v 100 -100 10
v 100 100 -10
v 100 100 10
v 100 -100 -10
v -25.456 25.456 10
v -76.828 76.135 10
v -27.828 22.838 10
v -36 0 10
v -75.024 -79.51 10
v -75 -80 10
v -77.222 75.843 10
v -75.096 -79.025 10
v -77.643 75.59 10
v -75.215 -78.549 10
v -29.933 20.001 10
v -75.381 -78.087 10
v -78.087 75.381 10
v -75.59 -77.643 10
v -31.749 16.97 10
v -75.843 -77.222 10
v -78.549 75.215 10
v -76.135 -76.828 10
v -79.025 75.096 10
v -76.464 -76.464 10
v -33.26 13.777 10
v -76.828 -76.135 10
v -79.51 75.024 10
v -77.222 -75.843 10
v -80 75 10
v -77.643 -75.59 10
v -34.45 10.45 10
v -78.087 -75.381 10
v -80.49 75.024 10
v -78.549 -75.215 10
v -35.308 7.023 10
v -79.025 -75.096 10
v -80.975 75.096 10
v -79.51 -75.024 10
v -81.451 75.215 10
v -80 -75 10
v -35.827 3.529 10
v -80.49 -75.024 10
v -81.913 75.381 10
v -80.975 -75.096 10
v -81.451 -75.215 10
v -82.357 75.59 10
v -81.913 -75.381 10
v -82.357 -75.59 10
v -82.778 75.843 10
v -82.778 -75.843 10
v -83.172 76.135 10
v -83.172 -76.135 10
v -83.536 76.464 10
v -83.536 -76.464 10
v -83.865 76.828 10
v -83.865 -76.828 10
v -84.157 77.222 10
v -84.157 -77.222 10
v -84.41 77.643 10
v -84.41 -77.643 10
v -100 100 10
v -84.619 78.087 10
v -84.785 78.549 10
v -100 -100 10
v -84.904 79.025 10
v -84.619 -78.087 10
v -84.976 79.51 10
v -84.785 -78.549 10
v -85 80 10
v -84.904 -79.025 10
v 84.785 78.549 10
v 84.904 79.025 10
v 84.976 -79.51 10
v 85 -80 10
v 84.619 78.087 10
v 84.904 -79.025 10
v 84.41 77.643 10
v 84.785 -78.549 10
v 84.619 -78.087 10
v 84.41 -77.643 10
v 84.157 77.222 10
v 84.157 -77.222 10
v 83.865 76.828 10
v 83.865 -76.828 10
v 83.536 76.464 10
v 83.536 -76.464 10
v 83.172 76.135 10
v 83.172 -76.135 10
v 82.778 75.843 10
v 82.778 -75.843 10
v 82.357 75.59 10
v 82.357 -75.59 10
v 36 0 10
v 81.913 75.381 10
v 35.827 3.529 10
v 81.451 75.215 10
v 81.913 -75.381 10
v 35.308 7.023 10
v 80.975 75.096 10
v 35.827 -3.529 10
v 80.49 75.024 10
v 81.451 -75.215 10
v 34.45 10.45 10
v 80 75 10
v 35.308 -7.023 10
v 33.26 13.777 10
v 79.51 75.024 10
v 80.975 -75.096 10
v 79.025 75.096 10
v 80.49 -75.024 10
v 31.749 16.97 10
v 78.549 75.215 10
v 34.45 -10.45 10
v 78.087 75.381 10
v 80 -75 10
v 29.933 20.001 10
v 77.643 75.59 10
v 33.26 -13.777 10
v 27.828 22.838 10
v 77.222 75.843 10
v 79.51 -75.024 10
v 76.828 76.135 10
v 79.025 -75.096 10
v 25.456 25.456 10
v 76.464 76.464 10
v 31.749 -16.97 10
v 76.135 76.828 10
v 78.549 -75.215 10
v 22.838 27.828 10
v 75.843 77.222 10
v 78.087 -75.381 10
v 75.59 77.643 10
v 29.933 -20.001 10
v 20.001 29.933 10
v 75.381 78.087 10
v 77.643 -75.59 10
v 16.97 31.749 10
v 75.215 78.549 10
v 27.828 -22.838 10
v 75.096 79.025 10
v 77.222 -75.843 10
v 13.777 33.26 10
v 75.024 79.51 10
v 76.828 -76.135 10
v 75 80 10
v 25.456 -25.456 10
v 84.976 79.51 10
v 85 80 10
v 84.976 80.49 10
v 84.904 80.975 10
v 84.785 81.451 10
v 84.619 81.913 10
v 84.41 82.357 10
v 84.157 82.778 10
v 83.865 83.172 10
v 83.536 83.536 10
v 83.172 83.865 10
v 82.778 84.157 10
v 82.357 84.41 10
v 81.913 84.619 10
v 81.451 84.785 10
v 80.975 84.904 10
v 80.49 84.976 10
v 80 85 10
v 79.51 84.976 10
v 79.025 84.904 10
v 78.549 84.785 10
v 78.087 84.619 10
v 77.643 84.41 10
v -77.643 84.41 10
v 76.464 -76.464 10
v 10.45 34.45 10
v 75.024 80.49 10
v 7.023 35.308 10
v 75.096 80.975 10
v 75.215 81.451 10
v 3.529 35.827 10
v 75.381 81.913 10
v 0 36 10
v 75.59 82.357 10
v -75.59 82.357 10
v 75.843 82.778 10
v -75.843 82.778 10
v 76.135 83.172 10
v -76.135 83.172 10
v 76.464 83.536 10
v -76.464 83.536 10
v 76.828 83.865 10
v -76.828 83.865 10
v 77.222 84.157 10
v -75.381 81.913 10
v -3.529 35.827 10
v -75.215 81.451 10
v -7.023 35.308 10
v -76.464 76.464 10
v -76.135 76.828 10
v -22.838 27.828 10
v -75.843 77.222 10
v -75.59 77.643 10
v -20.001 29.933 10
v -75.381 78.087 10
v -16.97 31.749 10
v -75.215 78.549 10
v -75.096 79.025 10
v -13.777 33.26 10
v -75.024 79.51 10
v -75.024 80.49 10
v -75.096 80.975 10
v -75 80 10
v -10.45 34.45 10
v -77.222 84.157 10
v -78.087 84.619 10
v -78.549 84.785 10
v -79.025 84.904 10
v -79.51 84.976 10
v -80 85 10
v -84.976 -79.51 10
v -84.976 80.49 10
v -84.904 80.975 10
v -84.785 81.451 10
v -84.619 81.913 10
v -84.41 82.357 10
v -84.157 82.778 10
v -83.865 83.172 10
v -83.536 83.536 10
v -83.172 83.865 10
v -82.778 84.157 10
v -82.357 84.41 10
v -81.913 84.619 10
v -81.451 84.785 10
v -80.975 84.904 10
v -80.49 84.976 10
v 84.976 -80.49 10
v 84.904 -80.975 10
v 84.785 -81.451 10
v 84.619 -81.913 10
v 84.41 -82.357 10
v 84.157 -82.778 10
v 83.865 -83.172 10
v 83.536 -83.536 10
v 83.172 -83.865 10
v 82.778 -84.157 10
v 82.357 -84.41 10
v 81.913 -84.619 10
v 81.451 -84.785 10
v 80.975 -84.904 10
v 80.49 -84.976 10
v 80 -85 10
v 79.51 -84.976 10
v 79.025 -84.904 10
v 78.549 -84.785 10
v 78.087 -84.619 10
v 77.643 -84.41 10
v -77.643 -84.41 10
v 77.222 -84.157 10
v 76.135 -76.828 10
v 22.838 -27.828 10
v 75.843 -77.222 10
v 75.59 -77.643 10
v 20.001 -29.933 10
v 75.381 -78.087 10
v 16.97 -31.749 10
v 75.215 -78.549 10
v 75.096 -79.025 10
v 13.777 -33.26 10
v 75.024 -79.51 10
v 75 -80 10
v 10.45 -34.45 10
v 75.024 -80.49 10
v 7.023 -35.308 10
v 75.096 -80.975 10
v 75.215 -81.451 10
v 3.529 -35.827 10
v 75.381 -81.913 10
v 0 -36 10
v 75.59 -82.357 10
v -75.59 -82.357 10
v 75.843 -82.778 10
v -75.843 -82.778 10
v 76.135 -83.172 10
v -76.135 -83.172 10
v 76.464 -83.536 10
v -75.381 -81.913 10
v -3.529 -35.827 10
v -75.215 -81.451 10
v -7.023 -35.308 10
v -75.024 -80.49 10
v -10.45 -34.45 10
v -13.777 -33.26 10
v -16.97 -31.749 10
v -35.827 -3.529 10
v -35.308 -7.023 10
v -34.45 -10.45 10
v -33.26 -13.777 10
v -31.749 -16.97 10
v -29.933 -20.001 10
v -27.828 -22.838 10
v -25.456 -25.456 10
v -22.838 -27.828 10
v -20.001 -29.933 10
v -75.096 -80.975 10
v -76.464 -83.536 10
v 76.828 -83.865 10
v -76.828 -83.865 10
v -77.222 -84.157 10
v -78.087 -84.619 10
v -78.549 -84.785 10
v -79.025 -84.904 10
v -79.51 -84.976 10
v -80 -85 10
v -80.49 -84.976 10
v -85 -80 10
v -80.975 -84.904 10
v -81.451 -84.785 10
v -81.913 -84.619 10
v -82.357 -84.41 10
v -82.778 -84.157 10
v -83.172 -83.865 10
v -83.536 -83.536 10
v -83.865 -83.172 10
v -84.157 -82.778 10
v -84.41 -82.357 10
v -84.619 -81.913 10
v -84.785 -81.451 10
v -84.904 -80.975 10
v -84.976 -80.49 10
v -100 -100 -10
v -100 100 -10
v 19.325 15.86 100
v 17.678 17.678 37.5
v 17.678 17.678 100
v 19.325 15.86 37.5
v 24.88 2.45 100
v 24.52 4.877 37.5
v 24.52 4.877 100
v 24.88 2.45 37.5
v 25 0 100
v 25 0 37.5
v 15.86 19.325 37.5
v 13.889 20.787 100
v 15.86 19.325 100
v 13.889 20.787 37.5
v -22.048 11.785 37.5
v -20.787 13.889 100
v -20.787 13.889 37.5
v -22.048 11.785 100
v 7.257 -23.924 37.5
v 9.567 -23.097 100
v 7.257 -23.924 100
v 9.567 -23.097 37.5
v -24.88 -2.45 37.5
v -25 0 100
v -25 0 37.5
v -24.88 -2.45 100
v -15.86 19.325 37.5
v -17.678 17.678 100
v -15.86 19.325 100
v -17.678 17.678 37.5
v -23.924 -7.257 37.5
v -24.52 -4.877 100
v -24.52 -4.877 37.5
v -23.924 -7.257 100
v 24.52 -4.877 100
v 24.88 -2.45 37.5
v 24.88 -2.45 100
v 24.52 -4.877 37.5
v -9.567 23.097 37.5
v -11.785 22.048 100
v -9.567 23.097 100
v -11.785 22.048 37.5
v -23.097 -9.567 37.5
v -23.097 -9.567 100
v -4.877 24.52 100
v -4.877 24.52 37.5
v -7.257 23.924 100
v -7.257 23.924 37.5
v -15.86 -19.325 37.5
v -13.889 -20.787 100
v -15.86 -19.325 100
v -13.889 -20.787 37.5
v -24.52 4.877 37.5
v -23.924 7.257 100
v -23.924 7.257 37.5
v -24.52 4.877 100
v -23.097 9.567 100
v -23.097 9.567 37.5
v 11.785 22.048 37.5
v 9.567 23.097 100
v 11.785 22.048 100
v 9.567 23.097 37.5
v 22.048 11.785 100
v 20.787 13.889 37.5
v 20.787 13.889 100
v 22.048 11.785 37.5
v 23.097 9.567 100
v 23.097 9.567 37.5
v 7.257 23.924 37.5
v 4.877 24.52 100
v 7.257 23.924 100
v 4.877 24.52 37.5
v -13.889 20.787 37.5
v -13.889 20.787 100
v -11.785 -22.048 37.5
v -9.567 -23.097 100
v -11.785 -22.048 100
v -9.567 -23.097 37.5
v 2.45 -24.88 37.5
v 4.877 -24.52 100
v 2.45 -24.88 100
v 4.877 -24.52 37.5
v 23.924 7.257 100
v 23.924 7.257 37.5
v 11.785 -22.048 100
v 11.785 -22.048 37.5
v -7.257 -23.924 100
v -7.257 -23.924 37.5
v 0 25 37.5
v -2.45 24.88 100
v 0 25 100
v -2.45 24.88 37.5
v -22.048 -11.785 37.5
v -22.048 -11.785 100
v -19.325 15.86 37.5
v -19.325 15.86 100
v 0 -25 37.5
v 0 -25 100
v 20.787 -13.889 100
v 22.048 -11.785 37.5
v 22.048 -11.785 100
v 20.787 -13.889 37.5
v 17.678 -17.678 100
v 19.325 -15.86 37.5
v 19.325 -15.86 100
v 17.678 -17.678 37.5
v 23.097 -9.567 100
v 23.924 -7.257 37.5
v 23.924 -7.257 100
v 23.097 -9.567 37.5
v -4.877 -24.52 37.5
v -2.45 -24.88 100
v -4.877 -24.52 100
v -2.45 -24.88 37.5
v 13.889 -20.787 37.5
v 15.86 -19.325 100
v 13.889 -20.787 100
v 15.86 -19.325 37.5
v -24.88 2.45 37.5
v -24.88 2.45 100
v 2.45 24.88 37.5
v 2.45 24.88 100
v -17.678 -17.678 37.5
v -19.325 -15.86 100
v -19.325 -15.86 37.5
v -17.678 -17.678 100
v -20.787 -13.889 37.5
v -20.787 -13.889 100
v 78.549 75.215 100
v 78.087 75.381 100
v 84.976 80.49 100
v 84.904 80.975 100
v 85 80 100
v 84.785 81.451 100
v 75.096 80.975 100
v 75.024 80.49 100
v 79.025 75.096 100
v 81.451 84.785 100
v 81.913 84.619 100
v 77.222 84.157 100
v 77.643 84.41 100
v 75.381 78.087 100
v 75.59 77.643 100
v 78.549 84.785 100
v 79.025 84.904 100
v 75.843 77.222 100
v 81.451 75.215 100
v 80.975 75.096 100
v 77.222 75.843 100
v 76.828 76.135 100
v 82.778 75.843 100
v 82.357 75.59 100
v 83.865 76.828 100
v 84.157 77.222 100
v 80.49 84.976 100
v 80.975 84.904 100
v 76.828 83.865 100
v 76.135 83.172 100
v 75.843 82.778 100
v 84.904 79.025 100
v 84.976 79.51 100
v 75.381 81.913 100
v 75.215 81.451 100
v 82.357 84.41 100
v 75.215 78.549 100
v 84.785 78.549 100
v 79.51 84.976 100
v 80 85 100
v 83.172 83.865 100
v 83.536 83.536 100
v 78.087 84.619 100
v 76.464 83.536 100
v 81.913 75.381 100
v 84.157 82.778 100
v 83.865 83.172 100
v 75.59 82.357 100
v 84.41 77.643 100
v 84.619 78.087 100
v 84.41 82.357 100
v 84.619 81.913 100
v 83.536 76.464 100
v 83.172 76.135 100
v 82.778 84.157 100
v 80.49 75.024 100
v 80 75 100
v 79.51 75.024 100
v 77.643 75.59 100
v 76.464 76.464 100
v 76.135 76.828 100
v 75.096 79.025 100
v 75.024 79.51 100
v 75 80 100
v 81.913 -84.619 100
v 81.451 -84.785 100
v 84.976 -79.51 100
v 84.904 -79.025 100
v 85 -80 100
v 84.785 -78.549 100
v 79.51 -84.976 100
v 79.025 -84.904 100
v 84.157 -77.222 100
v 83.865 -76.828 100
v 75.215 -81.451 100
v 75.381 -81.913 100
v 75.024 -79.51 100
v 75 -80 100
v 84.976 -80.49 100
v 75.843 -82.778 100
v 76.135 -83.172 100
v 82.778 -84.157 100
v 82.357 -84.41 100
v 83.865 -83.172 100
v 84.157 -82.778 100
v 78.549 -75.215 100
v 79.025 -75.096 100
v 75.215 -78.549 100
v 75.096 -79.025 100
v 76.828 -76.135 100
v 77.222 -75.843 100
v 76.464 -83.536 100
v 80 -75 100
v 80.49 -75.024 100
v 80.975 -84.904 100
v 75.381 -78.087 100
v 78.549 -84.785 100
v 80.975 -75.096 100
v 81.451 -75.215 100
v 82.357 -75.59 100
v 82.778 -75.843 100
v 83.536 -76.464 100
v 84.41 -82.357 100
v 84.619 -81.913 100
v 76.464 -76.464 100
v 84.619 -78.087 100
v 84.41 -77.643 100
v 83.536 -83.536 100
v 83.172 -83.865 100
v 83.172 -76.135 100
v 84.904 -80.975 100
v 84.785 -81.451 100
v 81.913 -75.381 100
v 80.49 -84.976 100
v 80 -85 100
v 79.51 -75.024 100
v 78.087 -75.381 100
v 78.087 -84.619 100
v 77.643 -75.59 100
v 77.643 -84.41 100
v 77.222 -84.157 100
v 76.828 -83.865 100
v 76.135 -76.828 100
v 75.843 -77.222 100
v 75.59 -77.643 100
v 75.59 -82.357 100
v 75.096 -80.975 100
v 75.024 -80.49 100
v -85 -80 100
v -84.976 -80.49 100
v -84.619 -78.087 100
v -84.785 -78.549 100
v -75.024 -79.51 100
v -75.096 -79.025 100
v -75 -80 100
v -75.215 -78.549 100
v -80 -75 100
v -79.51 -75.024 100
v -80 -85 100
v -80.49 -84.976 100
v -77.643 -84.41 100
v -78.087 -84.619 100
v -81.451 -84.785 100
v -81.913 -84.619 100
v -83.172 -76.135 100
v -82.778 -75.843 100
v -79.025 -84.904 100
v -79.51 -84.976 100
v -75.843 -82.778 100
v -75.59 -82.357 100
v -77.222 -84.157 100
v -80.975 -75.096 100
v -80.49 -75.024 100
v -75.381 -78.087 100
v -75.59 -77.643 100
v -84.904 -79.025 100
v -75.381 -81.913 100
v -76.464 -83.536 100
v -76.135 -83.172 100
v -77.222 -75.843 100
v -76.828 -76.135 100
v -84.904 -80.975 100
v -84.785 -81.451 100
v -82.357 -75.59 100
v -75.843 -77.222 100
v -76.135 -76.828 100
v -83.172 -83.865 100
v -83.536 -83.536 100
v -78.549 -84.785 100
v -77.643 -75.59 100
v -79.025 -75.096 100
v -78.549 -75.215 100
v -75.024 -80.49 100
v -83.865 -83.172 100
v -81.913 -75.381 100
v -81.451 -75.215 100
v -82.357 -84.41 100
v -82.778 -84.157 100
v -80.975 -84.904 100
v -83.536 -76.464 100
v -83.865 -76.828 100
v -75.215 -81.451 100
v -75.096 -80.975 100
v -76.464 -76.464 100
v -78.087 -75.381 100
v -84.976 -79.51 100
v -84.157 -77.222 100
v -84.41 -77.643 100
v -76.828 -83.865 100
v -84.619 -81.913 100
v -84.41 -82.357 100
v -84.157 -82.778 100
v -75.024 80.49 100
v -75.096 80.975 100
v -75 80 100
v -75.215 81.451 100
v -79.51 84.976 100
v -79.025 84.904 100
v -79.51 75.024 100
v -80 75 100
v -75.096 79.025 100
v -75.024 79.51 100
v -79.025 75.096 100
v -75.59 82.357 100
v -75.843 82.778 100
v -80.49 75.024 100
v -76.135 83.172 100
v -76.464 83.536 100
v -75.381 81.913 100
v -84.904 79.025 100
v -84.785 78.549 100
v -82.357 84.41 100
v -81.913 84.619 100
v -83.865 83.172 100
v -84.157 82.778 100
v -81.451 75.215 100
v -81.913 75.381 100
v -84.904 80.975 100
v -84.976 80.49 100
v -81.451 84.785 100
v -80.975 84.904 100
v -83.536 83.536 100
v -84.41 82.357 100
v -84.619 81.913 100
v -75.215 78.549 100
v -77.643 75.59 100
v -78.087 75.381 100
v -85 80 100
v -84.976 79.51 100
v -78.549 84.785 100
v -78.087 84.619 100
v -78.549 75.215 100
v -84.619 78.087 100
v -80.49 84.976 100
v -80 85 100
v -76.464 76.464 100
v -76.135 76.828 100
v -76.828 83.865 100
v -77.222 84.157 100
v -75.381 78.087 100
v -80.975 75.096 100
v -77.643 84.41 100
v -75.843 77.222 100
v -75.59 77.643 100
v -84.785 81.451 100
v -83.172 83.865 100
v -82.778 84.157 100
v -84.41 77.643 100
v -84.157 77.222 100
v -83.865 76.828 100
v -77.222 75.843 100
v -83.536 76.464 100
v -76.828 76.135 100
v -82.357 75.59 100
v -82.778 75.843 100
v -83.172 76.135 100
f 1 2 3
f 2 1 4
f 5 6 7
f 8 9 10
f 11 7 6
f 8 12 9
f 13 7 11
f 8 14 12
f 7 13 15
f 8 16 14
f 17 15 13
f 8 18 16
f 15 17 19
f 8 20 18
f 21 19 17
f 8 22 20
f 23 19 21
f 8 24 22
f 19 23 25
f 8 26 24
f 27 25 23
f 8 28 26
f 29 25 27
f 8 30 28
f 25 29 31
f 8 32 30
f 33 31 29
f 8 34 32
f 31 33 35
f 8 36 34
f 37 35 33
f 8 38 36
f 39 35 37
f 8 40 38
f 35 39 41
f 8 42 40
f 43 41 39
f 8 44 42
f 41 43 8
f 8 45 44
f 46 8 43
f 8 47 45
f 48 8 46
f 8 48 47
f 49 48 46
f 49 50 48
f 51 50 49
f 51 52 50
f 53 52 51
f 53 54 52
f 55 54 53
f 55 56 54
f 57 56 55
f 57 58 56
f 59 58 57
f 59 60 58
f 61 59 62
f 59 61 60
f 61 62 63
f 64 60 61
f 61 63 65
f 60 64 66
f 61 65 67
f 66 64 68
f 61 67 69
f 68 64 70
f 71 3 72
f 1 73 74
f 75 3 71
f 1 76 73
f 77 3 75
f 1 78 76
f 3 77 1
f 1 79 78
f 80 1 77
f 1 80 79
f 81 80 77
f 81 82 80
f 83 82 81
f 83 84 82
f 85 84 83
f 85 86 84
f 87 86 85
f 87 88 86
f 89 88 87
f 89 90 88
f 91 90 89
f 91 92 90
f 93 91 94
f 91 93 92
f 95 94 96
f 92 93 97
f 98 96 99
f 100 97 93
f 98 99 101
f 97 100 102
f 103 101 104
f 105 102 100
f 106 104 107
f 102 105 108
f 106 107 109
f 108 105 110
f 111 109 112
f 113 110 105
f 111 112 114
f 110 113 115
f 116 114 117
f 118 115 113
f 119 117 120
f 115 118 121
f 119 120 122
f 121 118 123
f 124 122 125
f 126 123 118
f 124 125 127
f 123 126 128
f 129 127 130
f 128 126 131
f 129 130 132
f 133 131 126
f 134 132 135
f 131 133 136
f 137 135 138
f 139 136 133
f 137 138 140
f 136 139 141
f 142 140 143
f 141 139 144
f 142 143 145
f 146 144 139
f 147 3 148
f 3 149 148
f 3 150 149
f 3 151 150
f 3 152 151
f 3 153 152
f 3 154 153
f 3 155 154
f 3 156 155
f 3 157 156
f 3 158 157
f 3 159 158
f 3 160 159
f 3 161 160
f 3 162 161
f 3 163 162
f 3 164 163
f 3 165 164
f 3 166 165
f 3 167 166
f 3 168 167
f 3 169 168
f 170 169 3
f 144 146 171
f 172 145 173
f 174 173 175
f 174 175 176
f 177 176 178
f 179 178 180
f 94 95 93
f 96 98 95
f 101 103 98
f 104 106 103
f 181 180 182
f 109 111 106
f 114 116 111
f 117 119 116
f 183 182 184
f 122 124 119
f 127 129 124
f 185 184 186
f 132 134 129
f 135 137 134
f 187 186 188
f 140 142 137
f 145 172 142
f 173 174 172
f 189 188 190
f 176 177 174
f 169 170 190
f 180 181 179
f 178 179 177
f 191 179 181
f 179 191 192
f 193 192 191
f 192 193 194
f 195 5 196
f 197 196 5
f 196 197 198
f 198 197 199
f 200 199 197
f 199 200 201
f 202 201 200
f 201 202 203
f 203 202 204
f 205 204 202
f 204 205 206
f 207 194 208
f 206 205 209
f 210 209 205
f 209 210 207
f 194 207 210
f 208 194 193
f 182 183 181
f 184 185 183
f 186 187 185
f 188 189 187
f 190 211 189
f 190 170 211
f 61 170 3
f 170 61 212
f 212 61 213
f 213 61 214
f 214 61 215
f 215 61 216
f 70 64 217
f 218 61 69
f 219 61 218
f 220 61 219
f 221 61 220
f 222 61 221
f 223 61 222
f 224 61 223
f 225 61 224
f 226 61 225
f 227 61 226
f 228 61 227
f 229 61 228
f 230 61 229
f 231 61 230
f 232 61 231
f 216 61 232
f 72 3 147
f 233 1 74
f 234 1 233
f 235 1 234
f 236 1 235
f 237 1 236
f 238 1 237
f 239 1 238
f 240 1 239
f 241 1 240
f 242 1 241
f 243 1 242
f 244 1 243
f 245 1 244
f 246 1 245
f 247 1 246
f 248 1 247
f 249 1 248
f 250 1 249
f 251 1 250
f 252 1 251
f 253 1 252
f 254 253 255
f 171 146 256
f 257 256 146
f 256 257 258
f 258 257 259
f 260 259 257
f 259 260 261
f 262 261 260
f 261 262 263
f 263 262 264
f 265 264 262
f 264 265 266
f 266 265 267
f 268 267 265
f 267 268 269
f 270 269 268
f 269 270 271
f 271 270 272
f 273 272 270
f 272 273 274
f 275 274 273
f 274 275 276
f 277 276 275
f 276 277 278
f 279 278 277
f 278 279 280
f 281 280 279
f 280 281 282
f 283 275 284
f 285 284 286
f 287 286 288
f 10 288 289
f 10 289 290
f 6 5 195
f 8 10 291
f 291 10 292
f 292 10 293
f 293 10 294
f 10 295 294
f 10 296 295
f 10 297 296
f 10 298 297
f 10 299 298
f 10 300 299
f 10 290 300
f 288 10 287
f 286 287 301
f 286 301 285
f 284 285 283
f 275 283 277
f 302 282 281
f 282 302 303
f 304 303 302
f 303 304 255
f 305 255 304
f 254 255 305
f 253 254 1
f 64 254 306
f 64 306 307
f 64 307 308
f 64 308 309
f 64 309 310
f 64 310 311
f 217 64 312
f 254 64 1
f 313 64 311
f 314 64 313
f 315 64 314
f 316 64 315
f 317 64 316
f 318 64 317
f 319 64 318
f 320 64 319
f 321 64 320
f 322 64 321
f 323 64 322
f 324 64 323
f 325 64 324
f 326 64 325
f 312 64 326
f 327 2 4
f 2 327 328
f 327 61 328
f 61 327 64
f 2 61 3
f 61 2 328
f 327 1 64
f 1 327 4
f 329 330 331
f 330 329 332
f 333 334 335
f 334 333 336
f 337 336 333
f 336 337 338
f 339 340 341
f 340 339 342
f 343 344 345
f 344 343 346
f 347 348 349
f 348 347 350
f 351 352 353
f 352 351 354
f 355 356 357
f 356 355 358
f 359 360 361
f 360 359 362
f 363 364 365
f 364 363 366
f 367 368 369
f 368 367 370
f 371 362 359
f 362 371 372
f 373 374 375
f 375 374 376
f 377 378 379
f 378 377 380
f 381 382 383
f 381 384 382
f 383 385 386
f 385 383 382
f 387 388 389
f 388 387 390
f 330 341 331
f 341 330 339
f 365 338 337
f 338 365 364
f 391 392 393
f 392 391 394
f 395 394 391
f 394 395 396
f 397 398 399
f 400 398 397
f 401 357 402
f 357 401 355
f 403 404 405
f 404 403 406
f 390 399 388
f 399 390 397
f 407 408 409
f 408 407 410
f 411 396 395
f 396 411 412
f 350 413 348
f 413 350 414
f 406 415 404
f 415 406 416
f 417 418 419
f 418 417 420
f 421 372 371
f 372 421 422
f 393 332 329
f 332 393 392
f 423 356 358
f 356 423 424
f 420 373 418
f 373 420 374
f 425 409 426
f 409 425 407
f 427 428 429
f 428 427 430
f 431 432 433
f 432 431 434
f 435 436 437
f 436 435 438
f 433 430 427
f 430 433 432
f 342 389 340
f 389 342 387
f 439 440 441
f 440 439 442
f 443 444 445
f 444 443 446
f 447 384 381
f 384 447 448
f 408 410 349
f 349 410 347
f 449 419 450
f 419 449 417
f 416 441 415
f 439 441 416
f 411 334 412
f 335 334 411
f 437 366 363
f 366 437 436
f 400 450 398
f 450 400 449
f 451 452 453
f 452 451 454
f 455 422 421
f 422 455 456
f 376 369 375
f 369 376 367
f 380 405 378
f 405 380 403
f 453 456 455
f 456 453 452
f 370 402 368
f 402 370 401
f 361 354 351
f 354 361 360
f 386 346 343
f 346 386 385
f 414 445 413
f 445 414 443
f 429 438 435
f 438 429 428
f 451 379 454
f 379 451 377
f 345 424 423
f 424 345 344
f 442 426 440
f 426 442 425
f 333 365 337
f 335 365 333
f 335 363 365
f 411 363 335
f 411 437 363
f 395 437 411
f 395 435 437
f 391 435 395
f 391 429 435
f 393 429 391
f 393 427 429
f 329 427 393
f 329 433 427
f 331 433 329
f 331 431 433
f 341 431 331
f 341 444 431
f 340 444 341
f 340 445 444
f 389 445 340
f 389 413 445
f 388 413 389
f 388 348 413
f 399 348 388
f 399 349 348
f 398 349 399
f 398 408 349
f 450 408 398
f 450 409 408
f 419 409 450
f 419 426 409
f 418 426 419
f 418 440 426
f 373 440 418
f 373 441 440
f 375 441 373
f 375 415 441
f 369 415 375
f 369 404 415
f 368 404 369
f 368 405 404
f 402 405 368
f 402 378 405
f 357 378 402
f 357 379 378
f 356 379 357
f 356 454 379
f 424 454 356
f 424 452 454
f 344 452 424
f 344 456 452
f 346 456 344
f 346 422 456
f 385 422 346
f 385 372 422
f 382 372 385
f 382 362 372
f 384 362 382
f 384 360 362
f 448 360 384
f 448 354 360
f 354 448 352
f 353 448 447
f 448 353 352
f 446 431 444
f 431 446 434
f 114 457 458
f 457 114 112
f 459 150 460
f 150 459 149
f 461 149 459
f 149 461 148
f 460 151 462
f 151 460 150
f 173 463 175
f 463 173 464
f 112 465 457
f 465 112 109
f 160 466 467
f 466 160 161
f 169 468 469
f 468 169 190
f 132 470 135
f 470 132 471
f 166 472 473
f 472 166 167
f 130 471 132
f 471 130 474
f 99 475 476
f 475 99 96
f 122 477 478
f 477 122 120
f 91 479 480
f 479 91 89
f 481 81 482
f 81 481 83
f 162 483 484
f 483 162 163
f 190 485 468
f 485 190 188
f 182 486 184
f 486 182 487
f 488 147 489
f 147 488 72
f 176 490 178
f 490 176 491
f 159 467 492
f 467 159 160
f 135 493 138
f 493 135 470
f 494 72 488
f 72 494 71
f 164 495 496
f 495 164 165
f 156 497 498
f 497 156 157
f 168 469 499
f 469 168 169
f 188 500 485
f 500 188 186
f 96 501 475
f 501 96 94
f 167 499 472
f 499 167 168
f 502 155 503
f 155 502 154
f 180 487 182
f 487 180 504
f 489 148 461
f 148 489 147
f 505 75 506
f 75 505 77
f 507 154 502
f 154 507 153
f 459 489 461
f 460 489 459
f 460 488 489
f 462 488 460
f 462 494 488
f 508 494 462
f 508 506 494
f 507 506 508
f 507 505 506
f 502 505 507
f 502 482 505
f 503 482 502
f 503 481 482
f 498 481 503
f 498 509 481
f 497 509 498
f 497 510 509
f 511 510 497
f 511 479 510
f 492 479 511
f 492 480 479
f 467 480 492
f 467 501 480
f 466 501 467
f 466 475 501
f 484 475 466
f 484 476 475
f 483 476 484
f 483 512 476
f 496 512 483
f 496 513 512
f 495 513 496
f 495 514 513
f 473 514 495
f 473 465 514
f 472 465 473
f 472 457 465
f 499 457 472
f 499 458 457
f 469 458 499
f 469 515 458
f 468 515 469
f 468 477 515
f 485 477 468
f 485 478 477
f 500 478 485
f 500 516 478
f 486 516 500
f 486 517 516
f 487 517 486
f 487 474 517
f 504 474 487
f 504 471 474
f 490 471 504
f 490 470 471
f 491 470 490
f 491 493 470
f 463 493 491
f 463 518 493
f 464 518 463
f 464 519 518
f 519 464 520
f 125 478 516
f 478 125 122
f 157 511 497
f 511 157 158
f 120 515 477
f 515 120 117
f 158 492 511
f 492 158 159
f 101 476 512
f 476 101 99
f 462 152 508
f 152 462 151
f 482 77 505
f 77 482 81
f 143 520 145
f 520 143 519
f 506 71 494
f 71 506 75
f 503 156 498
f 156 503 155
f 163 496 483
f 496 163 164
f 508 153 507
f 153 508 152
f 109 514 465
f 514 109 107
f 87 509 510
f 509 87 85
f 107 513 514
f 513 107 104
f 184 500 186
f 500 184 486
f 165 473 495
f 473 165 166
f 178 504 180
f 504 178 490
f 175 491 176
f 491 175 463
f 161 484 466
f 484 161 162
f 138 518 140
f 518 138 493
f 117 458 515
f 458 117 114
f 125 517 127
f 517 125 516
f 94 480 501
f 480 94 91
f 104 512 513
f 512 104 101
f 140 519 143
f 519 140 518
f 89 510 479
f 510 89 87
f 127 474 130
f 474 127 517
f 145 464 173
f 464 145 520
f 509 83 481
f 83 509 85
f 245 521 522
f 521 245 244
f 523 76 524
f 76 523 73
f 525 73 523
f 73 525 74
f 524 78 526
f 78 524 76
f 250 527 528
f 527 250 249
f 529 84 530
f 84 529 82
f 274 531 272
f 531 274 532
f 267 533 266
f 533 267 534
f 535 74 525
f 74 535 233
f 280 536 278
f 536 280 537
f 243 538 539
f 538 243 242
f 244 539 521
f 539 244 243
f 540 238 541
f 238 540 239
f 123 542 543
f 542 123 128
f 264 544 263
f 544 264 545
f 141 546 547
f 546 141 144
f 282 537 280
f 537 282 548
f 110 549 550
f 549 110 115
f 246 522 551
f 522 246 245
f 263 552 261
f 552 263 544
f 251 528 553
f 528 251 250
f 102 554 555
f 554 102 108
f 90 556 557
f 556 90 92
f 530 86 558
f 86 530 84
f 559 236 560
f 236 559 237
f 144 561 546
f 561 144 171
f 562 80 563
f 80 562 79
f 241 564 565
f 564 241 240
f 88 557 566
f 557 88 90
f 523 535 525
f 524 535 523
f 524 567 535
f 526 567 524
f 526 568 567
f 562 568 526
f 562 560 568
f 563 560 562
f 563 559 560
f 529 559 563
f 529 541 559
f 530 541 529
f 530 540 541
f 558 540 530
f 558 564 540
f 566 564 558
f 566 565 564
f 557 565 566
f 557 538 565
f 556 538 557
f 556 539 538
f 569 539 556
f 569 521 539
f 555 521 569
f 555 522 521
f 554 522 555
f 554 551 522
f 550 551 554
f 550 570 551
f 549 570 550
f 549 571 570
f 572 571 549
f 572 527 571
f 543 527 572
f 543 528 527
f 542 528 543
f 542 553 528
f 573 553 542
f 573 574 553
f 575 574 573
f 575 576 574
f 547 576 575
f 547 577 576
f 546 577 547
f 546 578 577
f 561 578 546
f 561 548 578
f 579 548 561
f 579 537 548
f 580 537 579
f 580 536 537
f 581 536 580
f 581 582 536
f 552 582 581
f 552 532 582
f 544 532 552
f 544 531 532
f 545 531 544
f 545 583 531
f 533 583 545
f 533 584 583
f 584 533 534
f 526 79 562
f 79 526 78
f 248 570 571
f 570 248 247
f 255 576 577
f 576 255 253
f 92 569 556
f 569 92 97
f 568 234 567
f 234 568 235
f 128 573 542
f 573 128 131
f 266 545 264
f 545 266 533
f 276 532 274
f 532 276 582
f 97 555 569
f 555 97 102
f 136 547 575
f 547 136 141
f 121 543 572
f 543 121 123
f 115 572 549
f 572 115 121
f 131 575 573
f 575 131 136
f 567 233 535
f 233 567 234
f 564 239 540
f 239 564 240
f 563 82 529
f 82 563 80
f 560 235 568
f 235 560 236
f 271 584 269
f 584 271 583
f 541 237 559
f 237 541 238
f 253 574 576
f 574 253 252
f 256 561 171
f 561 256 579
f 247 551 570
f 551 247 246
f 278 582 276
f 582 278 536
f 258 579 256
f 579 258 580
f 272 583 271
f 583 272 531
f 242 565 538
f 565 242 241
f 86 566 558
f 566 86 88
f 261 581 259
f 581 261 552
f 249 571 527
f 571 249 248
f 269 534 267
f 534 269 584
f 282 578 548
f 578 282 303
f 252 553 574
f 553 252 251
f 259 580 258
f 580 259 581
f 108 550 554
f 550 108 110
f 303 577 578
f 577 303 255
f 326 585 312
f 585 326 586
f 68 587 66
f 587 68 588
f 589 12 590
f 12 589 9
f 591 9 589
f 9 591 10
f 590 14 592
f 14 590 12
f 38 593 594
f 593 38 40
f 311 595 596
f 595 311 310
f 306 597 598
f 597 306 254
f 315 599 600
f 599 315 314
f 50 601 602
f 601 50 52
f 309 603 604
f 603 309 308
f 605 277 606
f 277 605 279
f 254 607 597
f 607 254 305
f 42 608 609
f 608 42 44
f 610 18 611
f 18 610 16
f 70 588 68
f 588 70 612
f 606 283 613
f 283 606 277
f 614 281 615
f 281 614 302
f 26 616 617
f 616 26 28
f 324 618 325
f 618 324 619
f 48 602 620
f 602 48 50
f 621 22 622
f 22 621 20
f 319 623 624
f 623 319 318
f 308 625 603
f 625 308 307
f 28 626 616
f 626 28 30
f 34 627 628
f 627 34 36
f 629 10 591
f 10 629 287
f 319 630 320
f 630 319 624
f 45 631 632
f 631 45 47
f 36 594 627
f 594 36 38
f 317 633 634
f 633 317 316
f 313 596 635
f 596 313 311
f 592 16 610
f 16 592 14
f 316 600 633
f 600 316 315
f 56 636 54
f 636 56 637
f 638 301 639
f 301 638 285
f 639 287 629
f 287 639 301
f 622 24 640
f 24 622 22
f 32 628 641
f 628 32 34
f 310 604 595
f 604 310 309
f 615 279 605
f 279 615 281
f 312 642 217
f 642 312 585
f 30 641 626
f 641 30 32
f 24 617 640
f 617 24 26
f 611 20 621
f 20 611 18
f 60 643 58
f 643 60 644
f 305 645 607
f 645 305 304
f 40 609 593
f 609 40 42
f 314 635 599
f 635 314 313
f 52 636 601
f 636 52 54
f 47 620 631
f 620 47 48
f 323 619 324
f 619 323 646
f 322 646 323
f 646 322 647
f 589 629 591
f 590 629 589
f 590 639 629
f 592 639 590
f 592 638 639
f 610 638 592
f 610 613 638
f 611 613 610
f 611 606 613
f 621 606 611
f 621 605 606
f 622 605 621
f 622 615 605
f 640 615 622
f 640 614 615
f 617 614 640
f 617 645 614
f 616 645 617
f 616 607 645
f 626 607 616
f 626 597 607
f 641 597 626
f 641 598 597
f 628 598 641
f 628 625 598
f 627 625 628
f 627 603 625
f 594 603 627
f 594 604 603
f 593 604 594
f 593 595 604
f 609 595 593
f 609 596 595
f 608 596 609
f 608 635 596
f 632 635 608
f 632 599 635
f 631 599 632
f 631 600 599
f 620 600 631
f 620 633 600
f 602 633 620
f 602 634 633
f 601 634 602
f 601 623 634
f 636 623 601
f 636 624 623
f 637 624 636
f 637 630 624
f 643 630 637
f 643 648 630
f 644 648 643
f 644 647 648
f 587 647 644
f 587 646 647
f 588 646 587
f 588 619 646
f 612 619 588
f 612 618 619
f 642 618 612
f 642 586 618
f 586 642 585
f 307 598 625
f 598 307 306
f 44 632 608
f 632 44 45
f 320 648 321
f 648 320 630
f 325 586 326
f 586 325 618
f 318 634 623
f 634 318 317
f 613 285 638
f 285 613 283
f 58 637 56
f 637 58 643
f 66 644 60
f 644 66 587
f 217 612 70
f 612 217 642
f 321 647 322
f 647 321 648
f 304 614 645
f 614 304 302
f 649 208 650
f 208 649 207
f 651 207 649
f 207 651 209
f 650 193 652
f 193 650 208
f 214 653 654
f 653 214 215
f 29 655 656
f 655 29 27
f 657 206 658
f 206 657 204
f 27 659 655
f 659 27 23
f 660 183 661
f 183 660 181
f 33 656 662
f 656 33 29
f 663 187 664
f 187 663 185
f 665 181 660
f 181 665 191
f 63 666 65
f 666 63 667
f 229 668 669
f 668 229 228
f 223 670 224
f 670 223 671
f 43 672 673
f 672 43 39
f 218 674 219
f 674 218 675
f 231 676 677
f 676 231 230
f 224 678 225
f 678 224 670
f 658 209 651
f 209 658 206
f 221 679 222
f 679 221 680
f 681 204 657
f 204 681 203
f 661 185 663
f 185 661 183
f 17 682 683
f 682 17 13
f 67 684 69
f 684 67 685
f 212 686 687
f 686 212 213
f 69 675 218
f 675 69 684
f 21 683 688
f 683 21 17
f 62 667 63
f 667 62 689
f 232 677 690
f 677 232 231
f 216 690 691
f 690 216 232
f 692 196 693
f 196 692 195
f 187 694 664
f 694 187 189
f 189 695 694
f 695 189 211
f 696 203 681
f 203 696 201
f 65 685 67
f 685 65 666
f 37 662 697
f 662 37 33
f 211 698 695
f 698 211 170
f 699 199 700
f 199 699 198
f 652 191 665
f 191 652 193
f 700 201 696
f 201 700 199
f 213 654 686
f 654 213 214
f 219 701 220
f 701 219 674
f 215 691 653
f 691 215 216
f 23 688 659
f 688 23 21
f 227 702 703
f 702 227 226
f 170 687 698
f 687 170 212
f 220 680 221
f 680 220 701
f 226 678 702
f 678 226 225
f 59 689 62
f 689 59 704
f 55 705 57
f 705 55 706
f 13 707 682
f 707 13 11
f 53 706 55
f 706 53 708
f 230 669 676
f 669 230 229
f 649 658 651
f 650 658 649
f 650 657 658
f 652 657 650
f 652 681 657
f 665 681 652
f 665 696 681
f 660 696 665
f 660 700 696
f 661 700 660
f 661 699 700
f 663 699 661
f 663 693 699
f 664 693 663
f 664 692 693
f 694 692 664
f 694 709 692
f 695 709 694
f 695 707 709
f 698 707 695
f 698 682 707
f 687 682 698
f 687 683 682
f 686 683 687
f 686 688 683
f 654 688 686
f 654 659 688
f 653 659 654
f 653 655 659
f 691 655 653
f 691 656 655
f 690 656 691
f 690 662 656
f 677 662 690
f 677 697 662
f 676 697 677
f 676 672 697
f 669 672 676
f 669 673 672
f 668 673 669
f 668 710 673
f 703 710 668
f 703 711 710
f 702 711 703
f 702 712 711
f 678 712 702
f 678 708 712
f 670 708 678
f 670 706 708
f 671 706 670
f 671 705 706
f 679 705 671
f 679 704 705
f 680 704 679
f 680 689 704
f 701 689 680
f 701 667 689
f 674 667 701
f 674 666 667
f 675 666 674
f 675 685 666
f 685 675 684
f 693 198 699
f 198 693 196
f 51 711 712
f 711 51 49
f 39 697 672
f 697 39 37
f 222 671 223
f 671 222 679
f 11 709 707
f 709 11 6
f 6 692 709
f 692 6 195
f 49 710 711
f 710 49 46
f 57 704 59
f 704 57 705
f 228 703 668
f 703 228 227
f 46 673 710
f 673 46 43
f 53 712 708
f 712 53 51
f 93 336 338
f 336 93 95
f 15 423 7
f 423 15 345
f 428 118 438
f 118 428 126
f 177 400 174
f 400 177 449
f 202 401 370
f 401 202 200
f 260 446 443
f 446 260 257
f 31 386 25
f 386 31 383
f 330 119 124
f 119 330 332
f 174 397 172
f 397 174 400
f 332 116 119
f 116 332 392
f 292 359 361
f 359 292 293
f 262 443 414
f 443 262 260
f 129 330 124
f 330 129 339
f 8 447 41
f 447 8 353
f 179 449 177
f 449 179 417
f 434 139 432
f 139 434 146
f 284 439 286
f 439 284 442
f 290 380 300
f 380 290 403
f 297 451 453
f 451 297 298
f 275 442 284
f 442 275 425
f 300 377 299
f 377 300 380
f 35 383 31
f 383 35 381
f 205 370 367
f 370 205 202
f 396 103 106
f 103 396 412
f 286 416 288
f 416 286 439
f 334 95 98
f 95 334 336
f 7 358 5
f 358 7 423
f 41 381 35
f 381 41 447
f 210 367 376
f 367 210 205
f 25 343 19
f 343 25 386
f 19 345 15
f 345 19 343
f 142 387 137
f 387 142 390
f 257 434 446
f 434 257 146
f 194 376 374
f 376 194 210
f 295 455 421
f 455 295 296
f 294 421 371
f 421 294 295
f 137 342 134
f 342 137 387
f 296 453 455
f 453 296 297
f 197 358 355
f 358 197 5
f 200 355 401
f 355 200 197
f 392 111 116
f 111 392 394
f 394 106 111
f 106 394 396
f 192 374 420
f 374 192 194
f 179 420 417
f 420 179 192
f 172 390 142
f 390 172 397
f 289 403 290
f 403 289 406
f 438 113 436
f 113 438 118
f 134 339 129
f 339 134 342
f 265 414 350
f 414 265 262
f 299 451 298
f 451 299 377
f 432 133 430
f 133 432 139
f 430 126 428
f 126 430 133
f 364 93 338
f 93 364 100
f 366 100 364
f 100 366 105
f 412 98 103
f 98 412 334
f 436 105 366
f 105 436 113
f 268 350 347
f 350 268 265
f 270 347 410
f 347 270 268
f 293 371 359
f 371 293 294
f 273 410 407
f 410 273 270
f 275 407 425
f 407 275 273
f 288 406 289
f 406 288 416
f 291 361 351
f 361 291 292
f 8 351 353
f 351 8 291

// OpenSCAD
union(){union(){cube(size=[200.0000,200.0000,20.0000],center=true);cylinder(h=100.0000,d=50.0000,$fn=64);translate([80.0,80.0,0.0]){cylinder(h=100.0000,d=10.0000,$fn=64);}translate([80.0,-80.0,0.0]){cylinder(h=100.0000,d=10.0000,$fn=64);}translate([-80.0,-80.0,0.0]){cylinder(h=100.0000,d=10.0000,$fn=64);}translate([-80.0,80.0,0.0]){cylinder(h=100.0000,d=10.0000,$fn=64);}}cylinder(h=100.0000,d1=80.0000,d2=0.0000,$fn=64);}
